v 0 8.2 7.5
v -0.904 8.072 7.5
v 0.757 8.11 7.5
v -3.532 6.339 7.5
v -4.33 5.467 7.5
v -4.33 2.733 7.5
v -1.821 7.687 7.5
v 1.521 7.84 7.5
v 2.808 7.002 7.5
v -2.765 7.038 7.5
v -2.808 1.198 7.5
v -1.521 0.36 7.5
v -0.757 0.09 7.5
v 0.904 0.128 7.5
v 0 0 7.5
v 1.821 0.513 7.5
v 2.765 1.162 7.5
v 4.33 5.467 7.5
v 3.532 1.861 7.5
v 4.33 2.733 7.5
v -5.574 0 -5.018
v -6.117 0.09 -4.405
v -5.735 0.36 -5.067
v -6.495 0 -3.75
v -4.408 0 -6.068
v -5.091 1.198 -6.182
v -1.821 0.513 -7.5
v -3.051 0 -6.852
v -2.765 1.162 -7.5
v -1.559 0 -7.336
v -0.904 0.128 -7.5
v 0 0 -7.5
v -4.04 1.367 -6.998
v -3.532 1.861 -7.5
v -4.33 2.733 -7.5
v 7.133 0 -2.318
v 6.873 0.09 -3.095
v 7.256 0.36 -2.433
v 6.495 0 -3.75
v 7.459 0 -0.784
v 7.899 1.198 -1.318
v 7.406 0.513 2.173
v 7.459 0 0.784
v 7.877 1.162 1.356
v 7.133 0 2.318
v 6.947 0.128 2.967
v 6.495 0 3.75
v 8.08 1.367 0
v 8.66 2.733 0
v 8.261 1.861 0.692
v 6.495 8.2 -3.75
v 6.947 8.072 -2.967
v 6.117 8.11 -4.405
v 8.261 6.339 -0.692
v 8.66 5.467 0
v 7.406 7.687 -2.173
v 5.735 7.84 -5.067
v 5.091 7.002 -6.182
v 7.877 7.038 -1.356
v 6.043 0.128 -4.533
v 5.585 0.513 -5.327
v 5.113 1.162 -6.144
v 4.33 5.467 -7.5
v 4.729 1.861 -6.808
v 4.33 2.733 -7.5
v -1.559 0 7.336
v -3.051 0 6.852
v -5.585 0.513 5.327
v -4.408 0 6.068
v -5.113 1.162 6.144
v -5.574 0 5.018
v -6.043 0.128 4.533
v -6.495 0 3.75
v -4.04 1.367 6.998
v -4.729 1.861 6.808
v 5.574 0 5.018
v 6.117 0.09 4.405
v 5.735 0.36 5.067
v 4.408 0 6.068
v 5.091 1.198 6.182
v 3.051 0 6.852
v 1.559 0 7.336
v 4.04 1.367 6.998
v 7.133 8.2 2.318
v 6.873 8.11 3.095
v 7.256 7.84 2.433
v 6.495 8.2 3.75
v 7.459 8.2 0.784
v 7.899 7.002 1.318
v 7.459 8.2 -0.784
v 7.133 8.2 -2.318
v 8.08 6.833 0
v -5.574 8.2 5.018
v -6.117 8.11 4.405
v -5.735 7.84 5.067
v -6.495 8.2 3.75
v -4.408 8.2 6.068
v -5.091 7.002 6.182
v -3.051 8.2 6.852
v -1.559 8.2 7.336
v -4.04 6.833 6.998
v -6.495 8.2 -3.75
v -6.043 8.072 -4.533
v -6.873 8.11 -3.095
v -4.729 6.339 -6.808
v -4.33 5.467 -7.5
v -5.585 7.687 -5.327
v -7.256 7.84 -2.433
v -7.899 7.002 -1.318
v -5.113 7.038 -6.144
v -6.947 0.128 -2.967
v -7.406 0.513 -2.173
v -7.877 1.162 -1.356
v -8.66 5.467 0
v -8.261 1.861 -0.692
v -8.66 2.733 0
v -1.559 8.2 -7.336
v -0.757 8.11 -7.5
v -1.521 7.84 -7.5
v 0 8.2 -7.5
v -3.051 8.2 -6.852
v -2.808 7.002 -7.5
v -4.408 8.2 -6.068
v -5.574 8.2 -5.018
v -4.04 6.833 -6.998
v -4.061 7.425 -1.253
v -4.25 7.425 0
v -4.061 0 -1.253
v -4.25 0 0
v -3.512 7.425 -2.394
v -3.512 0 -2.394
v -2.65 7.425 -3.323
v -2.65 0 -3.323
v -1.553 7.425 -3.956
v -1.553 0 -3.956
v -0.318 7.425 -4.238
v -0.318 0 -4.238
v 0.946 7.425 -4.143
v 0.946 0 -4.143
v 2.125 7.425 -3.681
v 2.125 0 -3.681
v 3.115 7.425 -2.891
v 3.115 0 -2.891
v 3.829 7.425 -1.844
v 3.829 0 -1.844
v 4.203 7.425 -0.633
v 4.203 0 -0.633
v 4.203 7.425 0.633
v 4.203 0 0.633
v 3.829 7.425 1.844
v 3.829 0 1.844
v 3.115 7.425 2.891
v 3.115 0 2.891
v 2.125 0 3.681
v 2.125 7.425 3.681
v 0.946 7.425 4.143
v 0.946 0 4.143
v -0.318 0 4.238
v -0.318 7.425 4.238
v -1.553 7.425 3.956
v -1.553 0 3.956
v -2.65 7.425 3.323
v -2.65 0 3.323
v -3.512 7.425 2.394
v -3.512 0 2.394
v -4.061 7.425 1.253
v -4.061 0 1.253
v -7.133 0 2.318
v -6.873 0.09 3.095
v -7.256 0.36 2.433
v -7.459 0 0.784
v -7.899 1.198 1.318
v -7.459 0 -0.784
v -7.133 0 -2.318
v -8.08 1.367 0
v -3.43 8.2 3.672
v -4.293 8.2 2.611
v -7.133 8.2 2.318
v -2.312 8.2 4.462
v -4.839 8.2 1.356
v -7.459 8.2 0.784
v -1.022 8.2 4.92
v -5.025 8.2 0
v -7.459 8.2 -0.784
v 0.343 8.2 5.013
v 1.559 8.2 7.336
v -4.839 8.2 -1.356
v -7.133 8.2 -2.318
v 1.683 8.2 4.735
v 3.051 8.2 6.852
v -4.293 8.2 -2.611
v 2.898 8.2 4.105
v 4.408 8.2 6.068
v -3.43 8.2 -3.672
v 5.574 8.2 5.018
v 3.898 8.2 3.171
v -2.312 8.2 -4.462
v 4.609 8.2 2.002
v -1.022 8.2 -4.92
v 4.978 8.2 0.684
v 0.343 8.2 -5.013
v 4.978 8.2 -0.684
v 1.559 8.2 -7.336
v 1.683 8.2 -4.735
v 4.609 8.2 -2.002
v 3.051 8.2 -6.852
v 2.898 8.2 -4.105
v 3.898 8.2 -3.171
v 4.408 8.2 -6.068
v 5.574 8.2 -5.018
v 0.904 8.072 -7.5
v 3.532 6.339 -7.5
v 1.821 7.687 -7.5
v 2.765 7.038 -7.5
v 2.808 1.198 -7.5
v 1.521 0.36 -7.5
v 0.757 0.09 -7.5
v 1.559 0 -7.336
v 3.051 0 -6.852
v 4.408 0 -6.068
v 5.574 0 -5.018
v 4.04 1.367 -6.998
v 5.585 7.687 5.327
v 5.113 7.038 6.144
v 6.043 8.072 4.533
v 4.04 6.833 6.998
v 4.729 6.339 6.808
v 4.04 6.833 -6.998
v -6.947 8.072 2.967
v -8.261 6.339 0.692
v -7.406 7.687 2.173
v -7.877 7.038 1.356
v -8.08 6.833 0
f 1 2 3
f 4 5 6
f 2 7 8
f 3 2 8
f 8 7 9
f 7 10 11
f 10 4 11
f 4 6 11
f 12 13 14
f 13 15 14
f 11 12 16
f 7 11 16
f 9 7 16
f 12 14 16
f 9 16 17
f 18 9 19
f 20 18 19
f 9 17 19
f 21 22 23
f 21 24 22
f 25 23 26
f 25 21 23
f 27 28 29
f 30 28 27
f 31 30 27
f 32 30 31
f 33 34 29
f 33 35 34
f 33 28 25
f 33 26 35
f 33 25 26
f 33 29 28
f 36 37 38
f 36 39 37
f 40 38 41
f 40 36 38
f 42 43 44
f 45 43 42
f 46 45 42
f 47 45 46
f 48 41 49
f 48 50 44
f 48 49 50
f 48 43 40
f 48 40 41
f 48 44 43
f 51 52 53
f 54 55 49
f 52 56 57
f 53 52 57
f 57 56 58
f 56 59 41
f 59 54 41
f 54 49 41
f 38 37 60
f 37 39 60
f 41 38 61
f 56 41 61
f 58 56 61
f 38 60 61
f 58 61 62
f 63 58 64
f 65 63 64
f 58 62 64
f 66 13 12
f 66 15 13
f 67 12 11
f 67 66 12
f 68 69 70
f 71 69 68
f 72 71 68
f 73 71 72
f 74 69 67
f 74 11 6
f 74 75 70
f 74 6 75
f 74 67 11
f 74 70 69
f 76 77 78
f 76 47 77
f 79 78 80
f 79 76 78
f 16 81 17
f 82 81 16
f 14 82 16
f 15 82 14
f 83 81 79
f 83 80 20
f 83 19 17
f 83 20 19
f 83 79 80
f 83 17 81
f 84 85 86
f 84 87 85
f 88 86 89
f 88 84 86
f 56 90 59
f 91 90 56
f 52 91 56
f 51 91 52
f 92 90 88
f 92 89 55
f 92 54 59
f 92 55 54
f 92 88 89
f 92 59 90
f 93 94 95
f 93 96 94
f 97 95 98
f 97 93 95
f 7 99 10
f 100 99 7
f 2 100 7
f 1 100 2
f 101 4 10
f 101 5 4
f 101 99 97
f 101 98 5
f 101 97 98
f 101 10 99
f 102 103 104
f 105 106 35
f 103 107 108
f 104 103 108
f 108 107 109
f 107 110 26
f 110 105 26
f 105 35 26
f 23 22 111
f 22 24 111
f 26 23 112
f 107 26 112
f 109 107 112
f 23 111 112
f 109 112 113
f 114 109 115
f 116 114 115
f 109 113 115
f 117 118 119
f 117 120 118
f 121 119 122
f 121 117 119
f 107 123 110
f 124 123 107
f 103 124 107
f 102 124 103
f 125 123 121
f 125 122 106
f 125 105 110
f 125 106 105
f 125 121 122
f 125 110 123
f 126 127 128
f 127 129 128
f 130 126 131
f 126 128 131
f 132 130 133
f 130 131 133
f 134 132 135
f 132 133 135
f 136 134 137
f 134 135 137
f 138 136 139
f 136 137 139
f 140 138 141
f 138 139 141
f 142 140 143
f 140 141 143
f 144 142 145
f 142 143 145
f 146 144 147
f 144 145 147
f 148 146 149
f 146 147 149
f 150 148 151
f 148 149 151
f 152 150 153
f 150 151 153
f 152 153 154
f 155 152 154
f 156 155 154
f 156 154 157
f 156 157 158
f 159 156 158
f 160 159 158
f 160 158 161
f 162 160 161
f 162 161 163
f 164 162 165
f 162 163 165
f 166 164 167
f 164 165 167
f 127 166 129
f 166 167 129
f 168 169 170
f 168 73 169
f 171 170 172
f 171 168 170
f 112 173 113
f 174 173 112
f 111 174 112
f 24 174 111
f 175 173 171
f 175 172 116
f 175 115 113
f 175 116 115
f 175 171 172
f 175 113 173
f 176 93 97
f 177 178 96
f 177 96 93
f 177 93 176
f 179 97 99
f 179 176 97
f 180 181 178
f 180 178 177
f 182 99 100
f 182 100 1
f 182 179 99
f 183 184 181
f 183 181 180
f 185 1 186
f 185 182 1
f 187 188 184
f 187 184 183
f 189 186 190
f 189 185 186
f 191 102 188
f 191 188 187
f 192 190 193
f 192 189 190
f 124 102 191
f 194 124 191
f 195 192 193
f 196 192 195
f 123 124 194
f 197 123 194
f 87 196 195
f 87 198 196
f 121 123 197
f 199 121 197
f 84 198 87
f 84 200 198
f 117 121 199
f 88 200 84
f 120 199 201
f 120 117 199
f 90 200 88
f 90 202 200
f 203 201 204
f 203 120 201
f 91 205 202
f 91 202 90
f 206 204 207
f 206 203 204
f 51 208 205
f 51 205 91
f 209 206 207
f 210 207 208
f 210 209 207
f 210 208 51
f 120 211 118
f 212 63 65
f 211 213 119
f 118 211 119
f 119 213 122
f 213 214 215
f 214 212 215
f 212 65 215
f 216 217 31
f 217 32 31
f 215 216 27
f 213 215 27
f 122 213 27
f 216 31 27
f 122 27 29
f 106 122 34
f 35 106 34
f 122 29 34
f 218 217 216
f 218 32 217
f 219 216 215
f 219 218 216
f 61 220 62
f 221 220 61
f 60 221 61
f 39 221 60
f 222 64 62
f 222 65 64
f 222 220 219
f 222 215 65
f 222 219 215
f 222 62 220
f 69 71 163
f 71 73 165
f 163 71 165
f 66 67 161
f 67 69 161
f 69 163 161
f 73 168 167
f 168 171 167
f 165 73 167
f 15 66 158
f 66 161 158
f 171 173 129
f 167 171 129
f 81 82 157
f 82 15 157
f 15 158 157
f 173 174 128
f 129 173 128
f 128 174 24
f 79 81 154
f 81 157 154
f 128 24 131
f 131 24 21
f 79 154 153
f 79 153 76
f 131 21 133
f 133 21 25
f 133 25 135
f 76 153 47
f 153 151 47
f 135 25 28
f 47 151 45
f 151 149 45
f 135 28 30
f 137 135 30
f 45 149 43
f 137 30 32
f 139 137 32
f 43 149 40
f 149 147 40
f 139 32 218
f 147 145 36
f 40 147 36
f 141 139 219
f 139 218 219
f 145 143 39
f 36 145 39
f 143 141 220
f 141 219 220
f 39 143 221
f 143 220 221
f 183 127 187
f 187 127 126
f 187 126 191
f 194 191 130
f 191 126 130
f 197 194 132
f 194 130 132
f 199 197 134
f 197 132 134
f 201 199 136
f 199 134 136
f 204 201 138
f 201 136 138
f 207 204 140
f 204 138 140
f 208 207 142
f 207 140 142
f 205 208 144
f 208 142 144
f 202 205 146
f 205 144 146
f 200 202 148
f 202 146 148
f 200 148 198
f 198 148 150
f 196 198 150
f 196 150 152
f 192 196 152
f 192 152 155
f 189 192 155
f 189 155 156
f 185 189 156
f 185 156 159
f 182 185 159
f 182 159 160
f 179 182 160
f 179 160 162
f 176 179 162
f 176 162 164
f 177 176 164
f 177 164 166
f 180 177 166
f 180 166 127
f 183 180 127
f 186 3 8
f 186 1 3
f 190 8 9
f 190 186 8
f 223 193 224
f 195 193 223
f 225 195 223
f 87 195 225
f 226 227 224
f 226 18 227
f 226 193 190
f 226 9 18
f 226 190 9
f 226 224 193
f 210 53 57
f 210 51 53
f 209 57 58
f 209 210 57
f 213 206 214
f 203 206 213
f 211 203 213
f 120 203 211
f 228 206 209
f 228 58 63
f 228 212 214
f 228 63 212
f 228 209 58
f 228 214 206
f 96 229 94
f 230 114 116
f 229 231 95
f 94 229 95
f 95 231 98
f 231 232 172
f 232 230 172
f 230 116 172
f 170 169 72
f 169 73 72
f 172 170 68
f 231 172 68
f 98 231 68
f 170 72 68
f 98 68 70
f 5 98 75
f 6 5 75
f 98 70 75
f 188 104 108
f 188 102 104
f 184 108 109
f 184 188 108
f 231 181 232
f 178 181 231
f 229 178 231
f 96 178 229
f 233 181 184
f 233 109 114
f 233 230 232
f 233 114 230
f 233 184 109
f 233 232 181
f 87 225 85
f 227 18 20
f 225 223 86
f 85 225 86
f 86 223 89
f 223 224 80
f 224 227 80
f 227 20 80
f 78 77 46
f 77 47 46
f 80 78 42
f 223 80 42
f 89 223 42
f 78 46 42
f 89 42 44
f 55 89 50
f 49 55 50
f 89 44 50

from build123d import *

# Parameters (mm, degrees)
EXTRUDE_1_DEPTH               = 8.2
SKETCH_2_OUTSIDE_W            = 31.148
SKETCH_2_OUTSIDE_H            = 28.828
SKETCH_2_OUTSIDE_R            = 7.5
CUT_EXTRUDE_1_DEPTH           = 8.2
CUT_EXTRUDE_1_DRAFT           = -23
SKETCH_3_OUTSIDE_W            = 31.148
SKETCH_3_OUTSIDE_H            = 28.828
SKETCH_3_OUTSIDE_R            = 7.5
CUT_EXTRUDE_2_DEPTH           = 8.2
CUT_EXTRUDE_2_DRAFT           = -23
HOLE_WIZARD_M10_1_D           = 8.5
HOLE_WIZARD_M10_1_CSINK_D     = 10.05
HOLE_WIZARD_M10_1_CSINK_ANGLE = 90


with BuildPart() as part:
    # 草图1 → 凸台-拉伸1 (new body)
    with BuildSketch(Plane(origin=(0, 0, 0), x_dir=(1, 0, 0), z_dir=(0, 1, 0))):
        Polygon((4.330127019, 7.5), (-4.330127019, 7.5), (-8.660254038, 0), (-4.330127019, -7.5), (4.330127019, -7.5), (8.660254038, 0), align=None)
    extrude(amount=EXTRUDE_1_DEPTH)


with BuildPart() as cut_extrude_1_tool:
    # 草图2 outside → 切除-拉伸1 (with draft: the straight prism first)
    with BuildSketch(Plane(origin=(0, 8.2, 0), x_dir=(1, 0, 0), z_dir=(0, 1, 0))):
        Rectangle(SKETCH_2_OUTSIDE_W, SKETCH_2_OUTSIDE_H)
        Circle(SKETCH_2_OUTSIDE_R, mode=Mode.SUBTRACT)
    extrude(amount=-CUT_EXTRUDE_1_DEPTH)
    # 切除-拉伸1: the draft: its side faces are tilted about the plane it starts from
    cut_extrude_1_sides = [cut_extrude_1_tool.faces().sort_by_distance(p)[0] for p in [
        (0, 4.1, 14.414),
        (15.574, 4.1, 0),
        (0, 4.1, -14.414),
        (-15.574, 4.1, 0),
        (-7.5, 4.1, 0),
    ]]
    draft(cut_extrude_1_sides, Plane(origin=(0, 8.2, 0), x_dir=(1, 0, 0), z_dir=(0, 1, 0)), CUT_EXTRUDE_1_DRAFT)


with BuildPart() as part_1:
    add(part.part)

    # 切除-拉伸1: cut by cut_extrude_1_tool
    add(cut_extrude_1_tool.part, mode=Mode.SUBTRACT)


with BuildPart() as cut_extrude_2_tool:
    # 草图3 outside → 切除-拉伸2 (with draft: the straight prism first)
    with BuildSketch(Plane.XZ):
        Rectangle(SKETCH_3_OUTSIDE_W, SKETCH_3_OUTSIDE_H)
        Circle(SKETCH_3_OUTSIDE_R, mode=Mode.SUBTRACT)
    extrude(amount=-CUT_EXTRUDE_2_DEPTH)
    # 切除-拉伸2: the draft: its side faces are tilted about the plane it starts from
    cut_extrude_2_sides = [cut_extrude_2_tool.faces().sort_by_distance(p)[0] for p in [
        (0, 4.1, -14.414),
        (15.574, 4.1, 0),
        (0, 4.1, 14.414),
        (-15.574, 4.1, 0),
        (-7.5, 4.1, 0),
    ]]
    draft(cut_extrude_2_sides, Plane.XZ, CUT_EXTRUDE_2_DRAFT)


with BuildPart() as part_2:
    add(part_1.part)

    # 切除-拉伸2: cut by cut_extrude_2_tool
    add(cut_extrude_2_tool.part, mode=Mode.SUBTRACT)

    # M10 螺纹孔1 (through all)
    with Locations(Plane(origin=(0, 8.2, 0), x_dir=(1, 0, 0), z_dir=(0, 1, 0))):
        with Locations((0, 0)):
            CounterSinkHole(HOLE_WIZARD_M10_1_D / 2, HOLE_WIZARD_M10_1_CSINK_D / 2, counter_sink_angle=HOLE_WIZARD_M10_1_CSINK_ANGLE)


solid = part_2.part
